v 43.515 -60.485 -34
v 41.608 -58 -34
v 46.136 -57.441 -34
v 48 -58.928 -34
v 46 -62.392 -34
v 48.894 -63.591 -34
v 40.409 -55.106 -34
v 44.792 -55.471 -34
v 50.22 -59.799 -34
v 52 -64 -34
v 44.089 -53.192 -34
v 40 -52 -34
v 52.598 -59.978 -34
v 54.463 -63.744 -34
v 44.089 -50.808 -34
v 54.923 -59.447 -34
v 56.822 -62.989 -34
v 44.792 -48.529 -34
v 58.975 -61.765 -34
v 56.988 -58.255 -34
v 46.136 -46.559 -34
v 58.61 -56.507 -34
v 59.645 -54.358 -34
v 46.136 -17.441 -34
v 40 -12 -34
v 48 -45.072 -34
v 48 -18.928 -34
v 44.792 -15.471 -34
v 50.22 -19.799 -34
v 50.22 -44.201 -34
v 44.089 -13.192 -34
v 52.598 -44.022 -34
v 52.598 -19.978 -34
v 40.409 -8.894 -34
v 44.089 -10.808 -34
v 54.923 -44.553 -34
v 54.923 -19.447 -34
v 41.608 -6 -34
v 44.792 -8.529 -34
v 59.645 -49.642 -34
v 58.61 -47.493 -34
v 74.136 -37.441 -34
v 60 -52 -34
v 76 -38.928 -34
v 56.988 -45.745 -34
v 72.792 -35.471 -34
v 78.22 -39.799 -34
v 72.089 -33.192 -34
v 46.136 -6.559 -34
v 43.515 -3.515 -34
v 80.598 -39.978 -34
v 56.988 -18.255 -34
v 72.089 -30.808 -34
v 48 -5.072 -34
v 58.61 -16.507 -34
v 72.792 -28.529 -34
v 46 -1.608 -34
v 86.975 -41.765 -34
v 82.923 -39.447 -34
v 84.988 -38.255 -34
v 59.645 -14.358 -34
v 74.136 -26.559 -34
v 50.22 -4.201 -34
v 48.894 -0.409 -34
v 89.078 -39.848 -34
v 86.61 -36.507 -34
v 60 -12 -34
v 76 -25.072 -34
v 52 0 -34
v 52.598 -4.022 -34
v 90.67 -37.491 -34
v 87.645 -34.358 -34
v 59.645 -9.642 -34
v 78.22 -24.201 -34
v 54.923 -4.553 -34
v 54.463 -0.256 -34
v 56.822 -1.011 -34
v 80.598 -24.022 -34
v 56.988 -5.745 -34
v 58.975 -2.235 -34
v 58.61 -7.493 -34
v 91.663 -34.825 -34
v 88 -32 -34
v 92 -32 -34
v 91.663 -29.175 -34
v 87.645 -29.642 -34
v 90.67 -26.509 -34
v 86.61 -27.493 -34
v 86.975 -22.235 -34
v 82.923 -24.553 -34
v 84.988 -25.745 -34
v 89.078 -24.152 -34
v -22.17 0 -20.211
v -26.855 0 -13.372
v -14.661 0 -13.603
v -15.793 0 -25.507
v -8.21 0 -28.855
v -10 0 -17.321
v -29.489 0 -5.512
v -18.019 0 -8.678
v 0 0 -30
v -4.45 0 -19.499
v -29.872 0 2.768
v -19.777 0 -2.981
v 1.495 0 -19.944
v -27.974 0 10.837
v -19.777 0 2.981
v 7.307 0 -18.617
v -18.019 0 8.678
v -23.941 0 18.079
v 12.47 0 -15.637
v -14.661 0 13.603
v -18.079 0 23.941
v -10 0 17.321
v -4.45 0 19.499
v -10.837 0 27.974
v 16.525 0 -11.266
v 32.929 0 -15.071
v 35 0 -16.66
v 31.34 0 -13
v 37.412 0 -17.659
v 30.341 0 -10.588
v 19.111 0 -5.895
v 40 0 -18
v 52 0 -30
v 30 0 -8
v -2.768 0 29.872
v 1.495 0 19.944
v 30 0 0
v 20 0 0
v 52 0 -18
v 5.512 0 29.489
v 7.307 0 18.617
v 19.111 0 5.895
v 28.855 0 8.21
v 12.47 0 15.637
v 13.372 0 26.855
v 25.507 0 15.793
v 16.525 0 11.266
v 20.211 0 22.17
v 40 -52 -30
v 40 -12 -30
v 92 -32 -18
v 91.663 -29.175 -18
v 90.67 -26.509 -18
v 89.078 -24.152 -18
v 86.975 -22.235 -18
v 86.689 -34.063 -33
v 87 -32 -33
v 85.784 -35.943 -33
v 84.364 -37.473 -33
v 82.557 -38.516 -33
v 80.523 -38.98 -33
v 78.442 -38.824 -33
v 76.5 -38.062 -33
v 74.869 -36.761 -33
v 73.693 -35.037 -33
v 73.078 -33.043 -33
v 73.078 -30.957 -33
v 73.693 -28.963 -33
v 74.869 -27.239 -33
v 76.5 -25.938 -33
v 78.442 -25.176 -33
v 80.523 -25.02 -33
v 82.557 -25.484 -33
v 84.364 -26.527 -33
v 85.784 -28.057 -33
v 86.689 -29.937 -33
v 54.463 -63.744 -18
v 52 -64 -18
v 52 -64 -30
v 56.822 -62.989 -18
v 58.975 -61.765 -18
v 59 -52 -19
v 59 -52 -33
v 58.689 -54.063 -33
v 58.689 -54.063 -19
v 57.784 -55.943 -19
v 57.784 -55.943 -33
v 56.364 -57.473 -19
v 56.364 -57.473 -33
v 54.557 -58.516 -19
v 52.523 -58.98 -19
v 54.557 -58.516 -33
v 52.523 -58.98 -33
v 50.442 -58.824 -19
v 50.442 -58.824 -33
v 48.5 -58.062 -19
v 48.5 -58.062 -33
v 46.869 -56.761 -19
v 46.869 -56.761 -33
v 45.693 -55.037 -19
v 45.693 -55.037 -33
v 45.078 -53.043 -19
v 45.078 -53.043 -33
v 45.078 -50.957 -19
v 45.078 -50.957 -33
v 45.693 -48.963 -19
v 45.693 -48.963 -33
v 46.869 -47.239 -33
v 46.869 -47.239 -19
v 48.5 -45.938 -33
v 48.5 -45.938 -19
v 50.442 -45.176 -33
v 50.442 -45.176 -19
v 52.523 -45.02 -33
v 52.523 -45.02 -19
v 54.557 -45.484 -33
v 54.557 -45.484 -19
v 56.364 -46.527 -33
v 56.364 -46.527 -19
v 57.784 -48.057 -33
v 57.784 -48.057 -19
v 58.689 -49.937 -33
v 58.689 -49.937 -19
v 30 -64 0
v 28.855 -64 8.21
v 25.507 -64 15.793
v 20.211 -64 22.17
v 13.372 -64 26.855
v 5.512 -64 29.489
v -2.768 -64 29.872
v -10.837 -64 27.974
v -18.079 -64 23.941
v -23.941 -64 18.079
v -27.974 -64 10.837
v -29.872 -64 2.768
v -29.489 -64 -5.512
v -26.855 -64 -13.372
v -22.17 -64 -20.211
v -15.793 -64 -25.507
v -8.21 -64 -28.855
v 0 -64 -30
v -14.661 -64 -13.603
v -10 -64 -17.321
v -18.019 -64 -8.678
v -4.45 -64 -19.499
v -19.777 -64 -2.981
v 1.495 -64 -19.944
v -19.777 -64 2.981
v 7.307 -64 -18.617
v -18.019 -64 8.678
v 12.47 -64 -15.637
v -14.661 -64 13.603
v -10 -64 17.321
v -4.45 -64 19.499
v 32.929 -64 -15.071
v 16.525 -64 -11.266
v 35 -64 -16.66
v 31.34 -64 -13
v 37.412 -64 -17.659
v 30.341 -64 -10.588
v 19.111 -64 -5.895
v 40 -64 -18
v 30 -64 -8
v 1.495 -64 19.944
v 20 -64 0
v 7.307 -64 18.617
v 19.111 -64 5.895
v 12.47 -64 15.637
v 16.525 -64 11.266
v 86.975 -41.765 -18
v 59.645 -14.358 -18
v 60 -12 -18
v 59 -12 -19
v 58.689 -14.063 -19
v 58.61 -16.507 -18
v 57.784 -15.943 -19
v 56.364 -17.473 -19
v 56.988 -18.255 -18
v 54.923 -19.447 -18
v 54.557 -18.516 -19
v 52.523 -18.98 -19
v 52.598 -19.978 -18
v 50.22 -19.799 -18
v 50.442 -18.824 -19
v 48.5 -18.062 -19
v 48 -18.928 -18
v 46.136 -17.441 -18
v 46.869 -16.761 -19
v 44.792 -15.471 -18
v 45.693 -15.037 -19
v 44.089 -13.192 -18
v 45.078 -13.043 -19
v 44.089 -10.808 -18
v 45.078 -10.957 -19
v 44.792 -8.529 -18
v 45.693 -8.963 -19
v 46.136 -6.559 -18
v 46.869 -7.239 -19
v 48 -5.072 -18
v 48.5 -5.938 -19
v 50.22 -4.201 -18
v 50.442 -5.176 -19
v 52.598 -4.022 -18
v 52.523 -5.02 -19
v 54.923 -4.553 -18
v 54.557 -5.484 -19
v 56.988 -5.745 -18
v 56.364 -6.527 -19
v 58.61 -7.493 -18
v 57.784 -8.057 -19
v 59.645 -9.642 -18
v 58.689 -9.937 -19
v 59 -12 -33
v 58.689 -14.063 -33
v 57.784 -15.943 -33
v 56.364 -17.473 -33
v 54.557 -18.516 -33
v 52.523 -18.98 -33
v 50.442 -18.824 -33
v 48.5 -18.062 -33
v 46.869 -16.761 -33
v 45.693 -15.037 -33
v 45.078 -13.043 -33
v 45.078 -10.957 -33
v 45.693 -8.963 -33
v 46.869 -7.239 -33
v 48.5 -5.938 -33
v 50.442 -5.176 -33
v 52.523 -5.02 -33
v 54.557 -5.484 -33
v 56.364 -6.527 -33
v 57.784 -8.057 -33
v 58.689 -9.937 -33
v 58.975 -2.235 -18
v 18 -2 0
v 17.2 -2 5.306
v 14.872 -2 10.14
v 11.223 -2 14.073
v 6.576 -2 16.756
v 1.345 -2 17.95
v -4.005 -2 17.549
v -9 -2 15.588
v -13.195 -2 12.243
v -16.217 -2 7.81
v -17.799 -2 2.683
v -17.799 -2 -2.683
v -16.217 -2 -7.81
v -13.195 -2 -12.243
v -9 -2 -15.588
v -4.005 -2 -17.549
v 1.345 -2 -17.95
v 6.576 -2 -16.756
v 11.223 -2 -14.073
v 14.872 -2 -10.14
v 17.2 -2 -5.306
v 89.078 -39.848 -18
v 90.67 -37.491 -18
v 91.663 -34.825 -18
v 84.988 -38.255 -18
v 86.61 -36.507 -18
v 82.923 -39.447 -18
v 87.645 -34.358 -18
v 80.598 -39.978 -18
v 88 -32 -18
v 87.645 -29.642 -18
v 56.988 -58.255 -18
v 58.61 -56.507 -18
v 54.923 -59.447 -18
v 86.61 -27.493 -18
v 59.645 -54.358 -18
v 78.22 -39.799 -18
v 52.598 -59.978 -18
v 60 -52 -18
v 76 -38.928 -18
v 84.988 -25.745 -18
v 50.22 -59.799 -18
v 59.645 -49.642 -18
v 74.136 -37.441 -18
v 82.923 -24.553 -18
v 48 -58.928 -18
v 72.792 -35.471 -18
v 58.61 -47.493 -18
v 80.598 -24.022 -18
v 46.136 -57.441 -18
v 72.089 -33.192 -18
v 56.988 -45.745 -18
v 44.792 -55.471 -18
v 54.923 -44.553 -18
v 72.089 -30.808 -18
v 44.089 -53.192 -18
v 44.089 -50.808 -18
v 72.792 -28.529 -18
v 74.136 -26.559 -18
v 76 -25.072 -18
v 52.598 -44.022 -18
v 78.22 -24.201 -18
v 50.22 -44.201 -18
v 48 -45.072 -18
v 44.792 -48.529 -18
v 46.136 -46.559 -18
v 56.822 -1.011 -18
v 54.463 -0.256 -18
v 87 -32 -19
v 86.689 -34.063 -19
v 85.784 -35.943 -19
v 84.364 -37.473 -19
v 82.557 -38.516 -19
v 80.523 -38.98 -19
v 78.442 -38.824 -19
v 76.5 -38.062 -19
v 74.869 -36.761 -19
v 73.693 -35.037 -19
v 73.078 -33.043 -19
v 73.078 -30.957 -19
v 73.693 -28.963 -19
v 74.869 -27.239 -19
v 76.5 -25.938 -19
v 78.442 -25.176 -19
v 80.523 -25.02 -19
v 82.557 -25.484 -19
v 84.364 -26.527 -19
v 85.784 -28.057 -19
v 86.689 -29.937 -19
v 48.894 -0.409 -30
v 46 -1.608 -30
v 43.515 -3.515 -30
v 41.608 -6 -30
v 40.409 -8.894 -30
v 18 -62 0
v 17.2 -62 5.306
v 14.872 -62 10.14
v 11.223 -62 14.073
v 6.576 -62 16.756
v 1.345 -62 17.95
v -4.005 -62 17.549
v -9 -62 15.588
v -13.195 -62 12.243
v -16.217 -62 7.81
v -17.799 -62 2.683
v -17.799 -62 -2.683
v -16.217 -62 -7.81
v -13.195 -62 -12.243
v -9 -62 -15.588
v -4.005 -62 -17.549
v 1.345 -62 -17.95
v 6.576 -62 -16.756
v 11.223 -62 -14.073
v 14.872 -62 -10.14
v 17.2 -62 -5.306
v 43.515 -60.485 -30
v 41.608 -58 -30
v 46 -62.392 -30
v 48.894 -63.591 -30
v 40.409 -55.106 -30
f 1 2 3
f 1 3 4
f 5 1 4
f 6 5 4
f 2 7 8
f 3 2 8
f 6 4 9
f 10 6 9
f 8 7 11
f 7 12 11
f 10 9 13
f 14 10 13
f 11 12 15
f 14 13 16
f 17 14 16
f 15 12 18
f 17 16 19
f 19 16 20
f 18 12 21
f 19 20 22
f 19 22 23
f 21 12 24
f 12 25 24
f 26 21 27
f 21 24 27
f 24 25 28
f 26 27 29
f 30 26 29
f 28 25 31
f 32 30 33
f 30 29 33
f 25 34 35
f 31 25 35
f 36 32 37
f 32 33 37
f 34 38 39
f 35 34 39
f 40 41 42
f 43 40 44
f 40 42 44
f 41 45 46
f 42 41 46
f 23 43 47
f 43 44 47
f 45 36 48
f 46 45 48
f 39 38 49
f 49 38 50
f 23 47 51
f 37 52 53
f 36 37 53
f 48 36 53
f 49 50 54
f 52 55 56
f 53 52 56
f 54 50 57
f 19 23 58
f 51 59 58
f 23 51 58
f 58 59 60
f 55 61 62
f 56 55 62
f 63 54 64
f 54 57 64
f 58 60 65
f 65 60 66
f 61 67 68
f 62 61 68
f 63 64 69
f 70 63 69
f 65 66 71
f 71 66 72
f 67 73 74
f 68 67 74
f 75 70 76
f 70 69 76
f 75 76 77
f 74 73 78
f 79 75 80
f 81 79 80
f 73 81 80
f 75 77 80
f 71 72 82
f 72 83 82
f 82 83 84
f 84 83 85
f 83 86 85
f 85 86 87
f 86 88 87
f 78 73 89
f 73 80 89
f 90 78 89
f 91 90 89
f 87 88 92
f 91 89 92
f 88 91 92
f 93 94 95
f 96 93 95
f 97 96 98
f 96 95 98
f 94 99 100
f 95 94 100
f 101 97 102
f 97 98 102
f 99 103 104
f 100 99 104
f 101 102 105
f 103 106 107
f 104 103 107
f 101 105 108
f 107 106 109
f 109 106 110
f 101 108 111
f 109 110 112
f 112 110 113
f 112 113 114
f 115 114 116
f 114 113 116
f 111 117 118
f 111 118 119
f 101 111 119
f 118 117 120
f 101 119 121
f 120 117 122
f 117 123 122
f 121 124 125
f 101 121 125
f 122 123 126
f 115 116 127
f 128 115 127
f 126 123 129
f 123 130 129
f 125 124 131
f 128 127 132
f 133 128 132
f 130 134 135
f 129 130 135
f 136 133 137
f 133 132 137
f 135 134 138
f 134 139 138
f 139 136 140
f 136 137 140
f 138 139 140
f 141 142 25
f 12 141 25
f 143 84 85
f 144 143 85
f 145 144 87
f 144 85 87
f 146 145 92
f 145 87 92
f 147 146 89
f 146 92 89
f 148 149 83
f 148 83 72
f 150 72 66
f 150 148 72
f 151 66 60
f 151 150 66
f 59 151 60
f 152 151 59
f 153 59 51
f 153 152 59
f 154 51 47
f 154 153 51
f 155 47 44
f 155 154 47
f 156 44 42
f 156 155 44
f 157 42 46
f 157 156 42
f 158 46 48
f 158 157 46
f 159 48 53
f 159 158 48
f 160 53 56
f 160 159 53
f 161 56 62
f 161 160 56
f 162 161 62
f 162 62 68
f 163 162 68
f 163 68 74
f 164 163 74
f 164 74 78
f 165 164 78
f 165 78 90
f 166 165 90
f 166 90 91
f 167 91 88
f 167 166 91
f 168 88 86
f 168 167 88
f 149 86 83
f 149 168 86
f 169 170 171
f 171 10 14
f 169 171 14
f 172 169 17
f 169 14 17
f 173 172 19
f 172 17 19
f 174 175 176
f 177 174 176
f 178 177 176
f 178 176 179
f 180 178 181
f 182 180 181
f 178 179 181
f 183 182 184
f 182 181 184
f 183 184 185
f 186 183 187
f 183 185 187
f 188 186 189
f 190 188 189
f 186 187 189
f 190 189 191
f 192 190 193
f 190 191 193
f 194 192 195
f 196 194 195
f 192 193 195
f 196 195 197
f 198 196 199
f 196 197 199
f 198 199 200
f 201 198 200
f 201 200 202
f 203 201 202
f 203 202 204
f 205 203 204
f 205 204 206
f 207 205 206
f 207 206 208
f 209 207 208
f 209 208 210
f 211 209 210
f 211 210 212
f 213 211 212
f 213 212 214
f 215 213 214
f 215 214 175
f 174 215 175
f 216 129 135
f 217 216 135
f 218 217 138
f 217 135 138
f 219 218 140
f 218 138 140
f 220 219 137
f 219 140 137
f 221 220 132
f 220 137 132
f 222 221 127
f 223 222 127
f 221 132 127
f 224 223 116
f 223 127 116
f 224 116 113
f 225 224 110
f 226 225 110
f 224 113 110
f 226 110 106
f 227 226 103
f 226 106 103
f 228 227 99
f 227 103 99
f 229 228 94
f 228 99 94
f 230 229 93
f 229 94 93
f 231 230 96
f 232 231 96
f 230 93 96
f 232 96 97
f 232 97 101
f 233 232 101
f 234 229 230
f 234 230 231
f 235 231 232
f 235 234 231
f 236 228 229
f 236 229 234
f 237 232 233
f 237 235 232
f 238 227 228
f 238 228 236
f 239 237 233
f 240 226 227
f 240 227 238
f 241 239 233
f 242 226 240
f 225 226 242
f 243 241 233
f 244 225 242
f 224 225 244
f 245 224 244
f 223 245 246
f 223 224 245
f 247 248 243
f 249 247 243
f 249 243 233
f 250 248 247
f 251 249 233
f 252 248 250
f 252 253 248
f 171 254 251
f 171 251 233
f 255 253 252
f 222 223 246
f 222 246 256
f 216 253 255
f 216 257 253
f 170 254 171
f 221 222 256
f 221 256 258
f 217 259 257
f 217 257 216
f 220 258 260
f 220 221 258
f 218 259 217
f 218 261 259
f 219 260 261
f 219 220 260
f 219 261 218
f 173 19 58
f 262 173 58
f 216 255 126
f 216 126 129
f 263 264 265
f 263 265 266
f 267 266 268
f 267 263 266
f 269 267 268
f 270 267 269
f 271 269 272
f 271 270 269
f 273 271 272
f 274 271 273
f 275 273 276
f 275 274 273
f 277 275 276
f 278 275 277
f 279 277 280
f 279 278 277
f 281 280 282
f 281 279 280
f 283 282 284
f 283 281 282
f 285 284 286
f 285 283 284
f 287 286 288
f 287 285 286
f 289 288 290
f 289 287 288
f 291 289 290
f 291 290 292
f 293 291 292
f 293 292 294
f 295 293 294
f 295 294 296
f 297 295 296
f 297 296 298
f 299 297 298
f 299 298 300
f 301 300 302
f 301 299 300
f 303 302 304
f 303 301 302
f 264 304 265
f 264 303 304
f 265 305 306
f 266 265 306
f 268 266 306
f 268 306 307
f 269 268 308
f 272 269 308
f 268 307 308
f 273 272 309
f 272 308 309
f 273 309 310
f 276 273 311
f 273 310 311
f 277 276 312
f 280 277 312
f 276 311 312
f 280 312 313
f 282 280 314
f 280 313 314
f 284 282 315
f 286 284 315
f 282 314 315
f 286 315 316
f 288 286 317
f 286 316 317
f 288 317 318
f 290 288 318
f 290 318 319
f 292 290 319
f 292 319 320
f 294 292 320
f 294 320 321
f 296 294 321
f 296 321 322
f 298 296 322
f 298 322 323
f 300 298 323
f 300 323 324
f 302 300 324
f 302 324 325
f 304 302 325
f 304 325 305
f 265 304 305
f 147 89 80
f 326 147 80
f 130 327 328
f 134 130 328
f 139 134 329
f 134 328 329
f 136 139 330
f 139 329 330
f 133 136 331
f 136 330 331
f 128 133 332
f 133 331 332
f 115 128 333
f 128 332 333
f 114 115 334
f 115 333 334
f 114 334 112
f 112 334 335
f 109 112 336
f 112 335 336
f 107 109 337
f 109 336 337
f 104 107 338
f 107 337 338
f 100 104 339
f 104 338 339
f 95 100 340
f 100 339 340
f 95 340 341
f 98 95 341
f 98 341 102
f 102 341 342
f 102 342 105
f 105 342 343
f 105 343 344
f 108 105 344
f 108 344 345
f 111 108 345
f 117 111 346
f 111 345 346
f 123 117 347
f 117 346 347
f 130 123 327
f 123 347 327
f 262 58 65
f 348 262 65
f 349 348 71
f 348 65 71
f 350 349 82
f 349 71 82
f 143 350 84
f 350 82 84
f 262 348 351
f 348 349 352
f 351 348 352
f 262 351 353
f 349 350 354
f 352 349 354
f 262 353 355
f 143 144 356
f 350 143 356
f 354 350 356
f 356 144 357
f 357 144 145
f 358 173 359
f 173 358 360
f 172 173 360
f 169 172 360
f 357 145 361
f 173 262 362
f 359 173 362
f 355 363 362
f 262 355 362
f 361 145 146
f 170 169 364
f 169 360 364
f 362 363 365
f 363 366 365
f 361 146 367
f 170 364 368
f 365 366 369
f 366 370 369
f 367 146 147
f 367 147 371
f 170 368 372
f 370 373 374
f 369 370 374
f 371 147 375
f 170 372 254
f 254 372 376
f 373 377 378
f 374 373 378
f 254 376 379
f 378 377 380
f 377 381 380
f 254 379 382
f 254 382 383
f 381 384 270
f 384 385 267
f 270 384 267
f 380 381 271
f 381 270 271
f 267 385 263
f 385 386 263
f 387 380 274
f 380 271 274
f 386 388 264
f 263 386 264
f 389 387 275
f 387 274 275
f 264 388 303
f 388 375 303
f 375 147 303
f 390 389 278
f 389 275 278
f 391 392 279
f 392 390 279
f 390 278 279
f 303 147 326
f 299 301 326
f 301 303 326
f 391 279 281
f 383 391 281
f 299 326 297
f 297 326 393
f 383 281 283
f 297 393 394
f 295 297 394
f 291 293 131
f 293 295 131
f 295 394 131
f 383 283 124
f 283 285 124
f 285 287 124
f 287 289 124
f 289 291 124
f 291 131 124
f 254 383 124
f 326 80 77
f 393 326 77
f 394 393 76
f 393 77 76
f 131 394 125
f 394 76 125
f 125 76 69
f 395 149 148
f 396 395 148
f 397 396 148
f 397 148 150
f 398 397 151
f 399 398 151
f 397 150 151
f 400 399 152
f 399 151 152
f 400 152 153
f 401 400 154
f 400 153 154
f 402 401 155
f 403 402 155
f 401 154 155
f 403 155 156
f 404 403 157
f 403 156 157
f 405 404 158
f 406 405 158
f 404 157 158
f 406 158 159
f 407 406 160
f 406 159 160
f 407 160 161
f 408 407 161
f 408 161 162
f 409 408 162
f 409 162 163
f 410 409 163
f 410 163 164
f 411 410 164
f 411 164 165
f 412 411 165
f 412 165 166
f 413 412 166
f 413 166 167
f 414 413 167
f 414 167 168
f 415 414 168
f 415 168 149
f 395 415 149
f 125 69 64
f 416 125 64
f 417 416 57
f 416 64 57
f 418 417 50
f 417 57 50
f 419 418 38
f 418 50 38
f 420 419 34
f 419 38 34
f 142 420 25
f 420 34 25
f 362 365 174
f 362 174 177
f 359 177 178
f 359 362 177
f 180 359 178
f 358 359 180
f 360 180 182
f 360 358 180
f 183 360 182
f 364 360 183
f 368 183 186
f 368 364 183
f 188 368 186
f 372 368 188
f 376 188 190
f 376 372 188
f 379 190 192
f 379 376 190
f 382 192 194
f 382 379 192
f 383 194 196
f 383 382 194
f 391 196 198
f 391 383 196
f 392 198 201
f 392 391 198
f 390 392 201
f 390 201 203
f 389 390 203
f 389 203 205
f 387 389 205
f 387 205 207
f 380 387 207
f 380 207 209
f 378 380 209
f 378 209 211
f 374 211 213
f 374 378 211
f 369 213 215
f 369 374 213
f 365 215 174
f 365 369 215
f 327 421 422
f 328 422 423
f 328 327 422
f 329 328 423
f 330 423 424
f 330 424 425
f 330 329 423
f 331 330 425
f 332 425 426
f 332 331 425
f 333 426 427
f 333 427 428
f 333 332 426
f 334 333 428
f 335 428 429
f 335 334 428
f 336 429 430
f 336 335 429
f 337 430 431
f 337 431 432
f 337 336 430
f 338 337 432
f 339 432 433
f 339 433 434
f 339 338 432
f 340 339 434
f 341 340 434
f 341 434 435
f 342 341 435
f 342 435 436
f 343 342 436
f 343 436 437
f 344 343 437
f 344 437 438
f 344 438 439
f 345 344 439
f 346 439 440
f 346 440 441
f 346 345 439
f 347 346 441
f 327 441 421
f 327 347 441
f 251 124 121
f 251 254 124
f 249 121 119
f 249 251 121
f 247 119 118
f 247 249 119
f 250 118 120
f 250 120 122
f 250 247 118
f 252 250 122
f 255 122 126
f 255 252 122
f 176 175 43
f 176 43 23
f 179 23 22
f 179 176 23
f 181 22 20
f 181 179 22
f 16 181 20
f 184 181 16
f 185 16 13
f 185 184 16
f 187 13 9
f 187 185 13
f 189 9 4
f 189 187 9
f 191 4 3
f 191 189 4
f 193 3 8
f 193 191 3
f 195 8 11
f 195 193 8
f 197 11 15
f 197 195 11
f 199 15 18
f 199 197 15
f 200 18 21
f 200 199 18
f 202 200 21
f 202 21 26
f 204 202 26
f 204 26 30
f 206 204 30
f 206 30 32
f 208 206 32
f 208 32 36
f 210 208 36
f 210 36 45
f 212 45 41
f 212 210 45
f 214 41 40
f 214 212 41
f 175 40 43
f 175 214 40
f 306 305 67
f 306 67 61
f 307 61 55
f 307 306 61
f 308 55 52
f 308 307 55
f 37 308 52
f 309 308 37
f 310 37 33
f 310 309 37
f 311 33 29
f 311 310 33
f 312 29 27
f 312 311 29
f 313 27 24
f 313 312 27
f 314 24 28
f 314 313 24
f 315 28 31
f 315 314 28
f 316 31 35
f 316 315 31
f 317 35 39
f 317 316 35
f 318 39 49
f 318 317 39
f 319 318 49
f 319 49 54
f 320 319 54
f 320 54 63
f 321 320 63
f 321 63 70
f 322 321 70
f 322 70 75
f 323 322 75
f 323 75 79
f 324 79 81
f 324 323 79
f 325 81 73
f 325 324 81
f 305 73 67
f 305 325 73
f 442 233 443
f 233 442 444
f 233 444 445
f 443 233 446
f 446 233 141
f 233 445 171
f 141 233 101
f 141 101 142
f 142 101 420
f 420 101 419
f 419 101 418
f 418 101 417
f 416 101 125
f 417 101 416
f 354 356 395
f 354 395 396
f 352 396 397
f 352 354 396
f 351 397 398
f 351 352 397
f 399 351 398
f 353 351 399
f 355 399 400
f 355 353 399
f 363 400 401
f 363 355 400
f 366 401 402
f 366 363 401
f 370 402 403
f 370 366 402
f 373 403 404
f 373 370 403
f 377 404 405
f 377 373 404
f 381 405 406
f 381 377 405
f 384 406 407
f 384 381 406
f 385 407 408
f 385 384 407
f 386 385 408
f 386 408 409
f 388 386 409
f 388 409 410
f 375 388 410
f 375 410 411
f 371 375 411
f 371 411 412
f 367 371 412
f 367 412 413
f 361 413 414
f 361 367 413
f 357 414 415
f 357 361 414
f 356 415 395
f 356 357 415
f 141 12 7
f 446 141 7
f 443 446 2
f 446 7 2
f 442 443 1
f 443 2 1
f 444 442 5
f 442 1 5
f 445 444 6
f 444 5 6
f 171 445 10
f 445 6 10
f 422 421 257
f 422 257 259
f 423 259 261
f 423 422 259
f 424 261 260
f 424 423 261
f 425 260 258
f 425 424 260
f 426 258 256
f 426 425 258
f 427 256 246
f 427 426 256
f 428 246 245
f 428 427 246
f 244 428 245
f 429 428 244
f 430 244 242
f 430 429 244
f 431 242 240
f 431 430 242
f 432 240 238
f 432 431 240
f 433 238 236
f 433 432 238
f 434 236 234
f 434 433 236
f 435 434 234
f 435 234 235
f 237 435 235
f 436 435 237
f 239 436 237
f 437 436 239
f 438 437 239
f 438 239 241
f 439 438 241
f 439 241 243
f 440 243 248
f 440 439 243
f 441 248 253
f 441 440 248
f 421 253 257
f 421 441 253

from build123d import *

# Parameters (mm, degrees)
F0_R     = 18
F1_DEPTH = 64
F2_R     = 7
F3_DEPTH = 25
F4_DEPTH = 4
F5_SIZE2 = 1
F5_SIZE  = 1
F6_SIZE2 = 2
F6_SIZE  = 2
F7_R     = 10


with BuildPart() as f1:
    # F0 (on Front) → F1 (new body)
    with BuildSketch(Plane.XZ):
        with BuildLine():
            ThreePointArc((0, -30), (21.213203, -21.213203), (30, 0))
            ThreePointArc((30, 0), (-21.213203, 21.213203), (0, -30))
        make_face()
        Circle(F0_R, mode=Mode.SUBTRACT)
        with BuildLine():
            Line((30, -18), (30, 0))
            ThreePointArc((30, 0), (21.213203, -21.213203), (0, -30))
            Line((0, -30), (40, -30))
            Line((40, -30), (40, -34))
            Line((40, -34), (52, -34))
            Line((52, -34), (80, -34))
            Line((80, -34), (92, -34))
            Line((92, -34), (92, -18))
            Line((92, -18), (30, -18))
        make_face()
    extrude(amount=F1_DEPTH)

    # F2 (on face) → F3 (cut)
    with BuildSketch(Plane(origin=(0, 0, -34), x_dir=(1, 0, 0), z_dir=(0, 0, -1))):
        with BuildLine():
            ThreePointArc((52, 64), (55.662129, 63.427546), (58.974858, 61.764802))
            Line((58.974858, 61.764802), (86.974858, 41.764802))
            ThreePointArc((86.974858, 41.764802), (90.670012, 37.490979), (92, 32))
            Line((92, 32), (92, 64))
            Line((92, 64), (52, 64))
        make_face()
        with BuildLine():
            Line((92, 0), (92, 32))
            ThreePointArc((92, 32), (90.670012, 26.509021), (86.974858, 22.235198))
            Line((86.974858, 22.235198), (58.974858, 2.235198))
            ThreePointArc((58.974858, 2.235198), (55.662129, 0.572454), (52, 0))
            Line((52, 0), (92, 0))
        make_face()
        with Locations((52, 52)):
            Circle(F2_R)
        with Locations((52, 12)):
            Circle(F2_R)
        with Locations((80, 32)):
            Circle(F2_R)
    extrude(amount=-F3_DEPTH, mode=Mode.SUBTRACT)

    # F2 (on face) → F4 (cut)
    with BuildSketch(Plane(origin=(0, 0, -34), x_dir=(1, 0, 0), z_dir=(0, 0, -1))):
        with BuildLine():
            ThreePointArc((40, 52), (43.514719, 60.485281), (52, 64))
            Line((52, 64), (40, 64))
            Line((40, 64), (40, 52))
        make_face()
        with BuildLine():
            ThreePointArc((52, 0), (43.514719, 3.514719), (40, 12))
            Line((40, 12), (40, 0))
            Line((40, 0), (52, 0))
        make_face()
    extrude(amount=-F4_DEPTH, mode=Mode.SUBTRACT)

    # F5
    f5_edges = [f1.edges().sort_by_distance(p)[0] for p in [
        (45, -12, -18),
        (73, -32, -18),
        (45, -52, -18),
        (45, -52, -34),
        (73, -32, -34),
        (45, -12, -34),
    ]]
    chamfer(f5_edges, length=F5_SIZE, length2=F5_SIZE2)

    # F6
    f6_edges = [f1.edges().sort_by_distance(p)[0] for p in [
        (-18, 0, 0),
        (-18, -64, 0),
    ]]
    chamfer(f6_edges, length=F6_SIZE, length2=F6_SIZE2)

    # F7
    f7_edges = [f1.edges().sort_by_distance(p)[0] for p in [
        (30, -32, -18),
    ]]
    fillet(f7_edges, radius=F7_R)


solid = f1.part
